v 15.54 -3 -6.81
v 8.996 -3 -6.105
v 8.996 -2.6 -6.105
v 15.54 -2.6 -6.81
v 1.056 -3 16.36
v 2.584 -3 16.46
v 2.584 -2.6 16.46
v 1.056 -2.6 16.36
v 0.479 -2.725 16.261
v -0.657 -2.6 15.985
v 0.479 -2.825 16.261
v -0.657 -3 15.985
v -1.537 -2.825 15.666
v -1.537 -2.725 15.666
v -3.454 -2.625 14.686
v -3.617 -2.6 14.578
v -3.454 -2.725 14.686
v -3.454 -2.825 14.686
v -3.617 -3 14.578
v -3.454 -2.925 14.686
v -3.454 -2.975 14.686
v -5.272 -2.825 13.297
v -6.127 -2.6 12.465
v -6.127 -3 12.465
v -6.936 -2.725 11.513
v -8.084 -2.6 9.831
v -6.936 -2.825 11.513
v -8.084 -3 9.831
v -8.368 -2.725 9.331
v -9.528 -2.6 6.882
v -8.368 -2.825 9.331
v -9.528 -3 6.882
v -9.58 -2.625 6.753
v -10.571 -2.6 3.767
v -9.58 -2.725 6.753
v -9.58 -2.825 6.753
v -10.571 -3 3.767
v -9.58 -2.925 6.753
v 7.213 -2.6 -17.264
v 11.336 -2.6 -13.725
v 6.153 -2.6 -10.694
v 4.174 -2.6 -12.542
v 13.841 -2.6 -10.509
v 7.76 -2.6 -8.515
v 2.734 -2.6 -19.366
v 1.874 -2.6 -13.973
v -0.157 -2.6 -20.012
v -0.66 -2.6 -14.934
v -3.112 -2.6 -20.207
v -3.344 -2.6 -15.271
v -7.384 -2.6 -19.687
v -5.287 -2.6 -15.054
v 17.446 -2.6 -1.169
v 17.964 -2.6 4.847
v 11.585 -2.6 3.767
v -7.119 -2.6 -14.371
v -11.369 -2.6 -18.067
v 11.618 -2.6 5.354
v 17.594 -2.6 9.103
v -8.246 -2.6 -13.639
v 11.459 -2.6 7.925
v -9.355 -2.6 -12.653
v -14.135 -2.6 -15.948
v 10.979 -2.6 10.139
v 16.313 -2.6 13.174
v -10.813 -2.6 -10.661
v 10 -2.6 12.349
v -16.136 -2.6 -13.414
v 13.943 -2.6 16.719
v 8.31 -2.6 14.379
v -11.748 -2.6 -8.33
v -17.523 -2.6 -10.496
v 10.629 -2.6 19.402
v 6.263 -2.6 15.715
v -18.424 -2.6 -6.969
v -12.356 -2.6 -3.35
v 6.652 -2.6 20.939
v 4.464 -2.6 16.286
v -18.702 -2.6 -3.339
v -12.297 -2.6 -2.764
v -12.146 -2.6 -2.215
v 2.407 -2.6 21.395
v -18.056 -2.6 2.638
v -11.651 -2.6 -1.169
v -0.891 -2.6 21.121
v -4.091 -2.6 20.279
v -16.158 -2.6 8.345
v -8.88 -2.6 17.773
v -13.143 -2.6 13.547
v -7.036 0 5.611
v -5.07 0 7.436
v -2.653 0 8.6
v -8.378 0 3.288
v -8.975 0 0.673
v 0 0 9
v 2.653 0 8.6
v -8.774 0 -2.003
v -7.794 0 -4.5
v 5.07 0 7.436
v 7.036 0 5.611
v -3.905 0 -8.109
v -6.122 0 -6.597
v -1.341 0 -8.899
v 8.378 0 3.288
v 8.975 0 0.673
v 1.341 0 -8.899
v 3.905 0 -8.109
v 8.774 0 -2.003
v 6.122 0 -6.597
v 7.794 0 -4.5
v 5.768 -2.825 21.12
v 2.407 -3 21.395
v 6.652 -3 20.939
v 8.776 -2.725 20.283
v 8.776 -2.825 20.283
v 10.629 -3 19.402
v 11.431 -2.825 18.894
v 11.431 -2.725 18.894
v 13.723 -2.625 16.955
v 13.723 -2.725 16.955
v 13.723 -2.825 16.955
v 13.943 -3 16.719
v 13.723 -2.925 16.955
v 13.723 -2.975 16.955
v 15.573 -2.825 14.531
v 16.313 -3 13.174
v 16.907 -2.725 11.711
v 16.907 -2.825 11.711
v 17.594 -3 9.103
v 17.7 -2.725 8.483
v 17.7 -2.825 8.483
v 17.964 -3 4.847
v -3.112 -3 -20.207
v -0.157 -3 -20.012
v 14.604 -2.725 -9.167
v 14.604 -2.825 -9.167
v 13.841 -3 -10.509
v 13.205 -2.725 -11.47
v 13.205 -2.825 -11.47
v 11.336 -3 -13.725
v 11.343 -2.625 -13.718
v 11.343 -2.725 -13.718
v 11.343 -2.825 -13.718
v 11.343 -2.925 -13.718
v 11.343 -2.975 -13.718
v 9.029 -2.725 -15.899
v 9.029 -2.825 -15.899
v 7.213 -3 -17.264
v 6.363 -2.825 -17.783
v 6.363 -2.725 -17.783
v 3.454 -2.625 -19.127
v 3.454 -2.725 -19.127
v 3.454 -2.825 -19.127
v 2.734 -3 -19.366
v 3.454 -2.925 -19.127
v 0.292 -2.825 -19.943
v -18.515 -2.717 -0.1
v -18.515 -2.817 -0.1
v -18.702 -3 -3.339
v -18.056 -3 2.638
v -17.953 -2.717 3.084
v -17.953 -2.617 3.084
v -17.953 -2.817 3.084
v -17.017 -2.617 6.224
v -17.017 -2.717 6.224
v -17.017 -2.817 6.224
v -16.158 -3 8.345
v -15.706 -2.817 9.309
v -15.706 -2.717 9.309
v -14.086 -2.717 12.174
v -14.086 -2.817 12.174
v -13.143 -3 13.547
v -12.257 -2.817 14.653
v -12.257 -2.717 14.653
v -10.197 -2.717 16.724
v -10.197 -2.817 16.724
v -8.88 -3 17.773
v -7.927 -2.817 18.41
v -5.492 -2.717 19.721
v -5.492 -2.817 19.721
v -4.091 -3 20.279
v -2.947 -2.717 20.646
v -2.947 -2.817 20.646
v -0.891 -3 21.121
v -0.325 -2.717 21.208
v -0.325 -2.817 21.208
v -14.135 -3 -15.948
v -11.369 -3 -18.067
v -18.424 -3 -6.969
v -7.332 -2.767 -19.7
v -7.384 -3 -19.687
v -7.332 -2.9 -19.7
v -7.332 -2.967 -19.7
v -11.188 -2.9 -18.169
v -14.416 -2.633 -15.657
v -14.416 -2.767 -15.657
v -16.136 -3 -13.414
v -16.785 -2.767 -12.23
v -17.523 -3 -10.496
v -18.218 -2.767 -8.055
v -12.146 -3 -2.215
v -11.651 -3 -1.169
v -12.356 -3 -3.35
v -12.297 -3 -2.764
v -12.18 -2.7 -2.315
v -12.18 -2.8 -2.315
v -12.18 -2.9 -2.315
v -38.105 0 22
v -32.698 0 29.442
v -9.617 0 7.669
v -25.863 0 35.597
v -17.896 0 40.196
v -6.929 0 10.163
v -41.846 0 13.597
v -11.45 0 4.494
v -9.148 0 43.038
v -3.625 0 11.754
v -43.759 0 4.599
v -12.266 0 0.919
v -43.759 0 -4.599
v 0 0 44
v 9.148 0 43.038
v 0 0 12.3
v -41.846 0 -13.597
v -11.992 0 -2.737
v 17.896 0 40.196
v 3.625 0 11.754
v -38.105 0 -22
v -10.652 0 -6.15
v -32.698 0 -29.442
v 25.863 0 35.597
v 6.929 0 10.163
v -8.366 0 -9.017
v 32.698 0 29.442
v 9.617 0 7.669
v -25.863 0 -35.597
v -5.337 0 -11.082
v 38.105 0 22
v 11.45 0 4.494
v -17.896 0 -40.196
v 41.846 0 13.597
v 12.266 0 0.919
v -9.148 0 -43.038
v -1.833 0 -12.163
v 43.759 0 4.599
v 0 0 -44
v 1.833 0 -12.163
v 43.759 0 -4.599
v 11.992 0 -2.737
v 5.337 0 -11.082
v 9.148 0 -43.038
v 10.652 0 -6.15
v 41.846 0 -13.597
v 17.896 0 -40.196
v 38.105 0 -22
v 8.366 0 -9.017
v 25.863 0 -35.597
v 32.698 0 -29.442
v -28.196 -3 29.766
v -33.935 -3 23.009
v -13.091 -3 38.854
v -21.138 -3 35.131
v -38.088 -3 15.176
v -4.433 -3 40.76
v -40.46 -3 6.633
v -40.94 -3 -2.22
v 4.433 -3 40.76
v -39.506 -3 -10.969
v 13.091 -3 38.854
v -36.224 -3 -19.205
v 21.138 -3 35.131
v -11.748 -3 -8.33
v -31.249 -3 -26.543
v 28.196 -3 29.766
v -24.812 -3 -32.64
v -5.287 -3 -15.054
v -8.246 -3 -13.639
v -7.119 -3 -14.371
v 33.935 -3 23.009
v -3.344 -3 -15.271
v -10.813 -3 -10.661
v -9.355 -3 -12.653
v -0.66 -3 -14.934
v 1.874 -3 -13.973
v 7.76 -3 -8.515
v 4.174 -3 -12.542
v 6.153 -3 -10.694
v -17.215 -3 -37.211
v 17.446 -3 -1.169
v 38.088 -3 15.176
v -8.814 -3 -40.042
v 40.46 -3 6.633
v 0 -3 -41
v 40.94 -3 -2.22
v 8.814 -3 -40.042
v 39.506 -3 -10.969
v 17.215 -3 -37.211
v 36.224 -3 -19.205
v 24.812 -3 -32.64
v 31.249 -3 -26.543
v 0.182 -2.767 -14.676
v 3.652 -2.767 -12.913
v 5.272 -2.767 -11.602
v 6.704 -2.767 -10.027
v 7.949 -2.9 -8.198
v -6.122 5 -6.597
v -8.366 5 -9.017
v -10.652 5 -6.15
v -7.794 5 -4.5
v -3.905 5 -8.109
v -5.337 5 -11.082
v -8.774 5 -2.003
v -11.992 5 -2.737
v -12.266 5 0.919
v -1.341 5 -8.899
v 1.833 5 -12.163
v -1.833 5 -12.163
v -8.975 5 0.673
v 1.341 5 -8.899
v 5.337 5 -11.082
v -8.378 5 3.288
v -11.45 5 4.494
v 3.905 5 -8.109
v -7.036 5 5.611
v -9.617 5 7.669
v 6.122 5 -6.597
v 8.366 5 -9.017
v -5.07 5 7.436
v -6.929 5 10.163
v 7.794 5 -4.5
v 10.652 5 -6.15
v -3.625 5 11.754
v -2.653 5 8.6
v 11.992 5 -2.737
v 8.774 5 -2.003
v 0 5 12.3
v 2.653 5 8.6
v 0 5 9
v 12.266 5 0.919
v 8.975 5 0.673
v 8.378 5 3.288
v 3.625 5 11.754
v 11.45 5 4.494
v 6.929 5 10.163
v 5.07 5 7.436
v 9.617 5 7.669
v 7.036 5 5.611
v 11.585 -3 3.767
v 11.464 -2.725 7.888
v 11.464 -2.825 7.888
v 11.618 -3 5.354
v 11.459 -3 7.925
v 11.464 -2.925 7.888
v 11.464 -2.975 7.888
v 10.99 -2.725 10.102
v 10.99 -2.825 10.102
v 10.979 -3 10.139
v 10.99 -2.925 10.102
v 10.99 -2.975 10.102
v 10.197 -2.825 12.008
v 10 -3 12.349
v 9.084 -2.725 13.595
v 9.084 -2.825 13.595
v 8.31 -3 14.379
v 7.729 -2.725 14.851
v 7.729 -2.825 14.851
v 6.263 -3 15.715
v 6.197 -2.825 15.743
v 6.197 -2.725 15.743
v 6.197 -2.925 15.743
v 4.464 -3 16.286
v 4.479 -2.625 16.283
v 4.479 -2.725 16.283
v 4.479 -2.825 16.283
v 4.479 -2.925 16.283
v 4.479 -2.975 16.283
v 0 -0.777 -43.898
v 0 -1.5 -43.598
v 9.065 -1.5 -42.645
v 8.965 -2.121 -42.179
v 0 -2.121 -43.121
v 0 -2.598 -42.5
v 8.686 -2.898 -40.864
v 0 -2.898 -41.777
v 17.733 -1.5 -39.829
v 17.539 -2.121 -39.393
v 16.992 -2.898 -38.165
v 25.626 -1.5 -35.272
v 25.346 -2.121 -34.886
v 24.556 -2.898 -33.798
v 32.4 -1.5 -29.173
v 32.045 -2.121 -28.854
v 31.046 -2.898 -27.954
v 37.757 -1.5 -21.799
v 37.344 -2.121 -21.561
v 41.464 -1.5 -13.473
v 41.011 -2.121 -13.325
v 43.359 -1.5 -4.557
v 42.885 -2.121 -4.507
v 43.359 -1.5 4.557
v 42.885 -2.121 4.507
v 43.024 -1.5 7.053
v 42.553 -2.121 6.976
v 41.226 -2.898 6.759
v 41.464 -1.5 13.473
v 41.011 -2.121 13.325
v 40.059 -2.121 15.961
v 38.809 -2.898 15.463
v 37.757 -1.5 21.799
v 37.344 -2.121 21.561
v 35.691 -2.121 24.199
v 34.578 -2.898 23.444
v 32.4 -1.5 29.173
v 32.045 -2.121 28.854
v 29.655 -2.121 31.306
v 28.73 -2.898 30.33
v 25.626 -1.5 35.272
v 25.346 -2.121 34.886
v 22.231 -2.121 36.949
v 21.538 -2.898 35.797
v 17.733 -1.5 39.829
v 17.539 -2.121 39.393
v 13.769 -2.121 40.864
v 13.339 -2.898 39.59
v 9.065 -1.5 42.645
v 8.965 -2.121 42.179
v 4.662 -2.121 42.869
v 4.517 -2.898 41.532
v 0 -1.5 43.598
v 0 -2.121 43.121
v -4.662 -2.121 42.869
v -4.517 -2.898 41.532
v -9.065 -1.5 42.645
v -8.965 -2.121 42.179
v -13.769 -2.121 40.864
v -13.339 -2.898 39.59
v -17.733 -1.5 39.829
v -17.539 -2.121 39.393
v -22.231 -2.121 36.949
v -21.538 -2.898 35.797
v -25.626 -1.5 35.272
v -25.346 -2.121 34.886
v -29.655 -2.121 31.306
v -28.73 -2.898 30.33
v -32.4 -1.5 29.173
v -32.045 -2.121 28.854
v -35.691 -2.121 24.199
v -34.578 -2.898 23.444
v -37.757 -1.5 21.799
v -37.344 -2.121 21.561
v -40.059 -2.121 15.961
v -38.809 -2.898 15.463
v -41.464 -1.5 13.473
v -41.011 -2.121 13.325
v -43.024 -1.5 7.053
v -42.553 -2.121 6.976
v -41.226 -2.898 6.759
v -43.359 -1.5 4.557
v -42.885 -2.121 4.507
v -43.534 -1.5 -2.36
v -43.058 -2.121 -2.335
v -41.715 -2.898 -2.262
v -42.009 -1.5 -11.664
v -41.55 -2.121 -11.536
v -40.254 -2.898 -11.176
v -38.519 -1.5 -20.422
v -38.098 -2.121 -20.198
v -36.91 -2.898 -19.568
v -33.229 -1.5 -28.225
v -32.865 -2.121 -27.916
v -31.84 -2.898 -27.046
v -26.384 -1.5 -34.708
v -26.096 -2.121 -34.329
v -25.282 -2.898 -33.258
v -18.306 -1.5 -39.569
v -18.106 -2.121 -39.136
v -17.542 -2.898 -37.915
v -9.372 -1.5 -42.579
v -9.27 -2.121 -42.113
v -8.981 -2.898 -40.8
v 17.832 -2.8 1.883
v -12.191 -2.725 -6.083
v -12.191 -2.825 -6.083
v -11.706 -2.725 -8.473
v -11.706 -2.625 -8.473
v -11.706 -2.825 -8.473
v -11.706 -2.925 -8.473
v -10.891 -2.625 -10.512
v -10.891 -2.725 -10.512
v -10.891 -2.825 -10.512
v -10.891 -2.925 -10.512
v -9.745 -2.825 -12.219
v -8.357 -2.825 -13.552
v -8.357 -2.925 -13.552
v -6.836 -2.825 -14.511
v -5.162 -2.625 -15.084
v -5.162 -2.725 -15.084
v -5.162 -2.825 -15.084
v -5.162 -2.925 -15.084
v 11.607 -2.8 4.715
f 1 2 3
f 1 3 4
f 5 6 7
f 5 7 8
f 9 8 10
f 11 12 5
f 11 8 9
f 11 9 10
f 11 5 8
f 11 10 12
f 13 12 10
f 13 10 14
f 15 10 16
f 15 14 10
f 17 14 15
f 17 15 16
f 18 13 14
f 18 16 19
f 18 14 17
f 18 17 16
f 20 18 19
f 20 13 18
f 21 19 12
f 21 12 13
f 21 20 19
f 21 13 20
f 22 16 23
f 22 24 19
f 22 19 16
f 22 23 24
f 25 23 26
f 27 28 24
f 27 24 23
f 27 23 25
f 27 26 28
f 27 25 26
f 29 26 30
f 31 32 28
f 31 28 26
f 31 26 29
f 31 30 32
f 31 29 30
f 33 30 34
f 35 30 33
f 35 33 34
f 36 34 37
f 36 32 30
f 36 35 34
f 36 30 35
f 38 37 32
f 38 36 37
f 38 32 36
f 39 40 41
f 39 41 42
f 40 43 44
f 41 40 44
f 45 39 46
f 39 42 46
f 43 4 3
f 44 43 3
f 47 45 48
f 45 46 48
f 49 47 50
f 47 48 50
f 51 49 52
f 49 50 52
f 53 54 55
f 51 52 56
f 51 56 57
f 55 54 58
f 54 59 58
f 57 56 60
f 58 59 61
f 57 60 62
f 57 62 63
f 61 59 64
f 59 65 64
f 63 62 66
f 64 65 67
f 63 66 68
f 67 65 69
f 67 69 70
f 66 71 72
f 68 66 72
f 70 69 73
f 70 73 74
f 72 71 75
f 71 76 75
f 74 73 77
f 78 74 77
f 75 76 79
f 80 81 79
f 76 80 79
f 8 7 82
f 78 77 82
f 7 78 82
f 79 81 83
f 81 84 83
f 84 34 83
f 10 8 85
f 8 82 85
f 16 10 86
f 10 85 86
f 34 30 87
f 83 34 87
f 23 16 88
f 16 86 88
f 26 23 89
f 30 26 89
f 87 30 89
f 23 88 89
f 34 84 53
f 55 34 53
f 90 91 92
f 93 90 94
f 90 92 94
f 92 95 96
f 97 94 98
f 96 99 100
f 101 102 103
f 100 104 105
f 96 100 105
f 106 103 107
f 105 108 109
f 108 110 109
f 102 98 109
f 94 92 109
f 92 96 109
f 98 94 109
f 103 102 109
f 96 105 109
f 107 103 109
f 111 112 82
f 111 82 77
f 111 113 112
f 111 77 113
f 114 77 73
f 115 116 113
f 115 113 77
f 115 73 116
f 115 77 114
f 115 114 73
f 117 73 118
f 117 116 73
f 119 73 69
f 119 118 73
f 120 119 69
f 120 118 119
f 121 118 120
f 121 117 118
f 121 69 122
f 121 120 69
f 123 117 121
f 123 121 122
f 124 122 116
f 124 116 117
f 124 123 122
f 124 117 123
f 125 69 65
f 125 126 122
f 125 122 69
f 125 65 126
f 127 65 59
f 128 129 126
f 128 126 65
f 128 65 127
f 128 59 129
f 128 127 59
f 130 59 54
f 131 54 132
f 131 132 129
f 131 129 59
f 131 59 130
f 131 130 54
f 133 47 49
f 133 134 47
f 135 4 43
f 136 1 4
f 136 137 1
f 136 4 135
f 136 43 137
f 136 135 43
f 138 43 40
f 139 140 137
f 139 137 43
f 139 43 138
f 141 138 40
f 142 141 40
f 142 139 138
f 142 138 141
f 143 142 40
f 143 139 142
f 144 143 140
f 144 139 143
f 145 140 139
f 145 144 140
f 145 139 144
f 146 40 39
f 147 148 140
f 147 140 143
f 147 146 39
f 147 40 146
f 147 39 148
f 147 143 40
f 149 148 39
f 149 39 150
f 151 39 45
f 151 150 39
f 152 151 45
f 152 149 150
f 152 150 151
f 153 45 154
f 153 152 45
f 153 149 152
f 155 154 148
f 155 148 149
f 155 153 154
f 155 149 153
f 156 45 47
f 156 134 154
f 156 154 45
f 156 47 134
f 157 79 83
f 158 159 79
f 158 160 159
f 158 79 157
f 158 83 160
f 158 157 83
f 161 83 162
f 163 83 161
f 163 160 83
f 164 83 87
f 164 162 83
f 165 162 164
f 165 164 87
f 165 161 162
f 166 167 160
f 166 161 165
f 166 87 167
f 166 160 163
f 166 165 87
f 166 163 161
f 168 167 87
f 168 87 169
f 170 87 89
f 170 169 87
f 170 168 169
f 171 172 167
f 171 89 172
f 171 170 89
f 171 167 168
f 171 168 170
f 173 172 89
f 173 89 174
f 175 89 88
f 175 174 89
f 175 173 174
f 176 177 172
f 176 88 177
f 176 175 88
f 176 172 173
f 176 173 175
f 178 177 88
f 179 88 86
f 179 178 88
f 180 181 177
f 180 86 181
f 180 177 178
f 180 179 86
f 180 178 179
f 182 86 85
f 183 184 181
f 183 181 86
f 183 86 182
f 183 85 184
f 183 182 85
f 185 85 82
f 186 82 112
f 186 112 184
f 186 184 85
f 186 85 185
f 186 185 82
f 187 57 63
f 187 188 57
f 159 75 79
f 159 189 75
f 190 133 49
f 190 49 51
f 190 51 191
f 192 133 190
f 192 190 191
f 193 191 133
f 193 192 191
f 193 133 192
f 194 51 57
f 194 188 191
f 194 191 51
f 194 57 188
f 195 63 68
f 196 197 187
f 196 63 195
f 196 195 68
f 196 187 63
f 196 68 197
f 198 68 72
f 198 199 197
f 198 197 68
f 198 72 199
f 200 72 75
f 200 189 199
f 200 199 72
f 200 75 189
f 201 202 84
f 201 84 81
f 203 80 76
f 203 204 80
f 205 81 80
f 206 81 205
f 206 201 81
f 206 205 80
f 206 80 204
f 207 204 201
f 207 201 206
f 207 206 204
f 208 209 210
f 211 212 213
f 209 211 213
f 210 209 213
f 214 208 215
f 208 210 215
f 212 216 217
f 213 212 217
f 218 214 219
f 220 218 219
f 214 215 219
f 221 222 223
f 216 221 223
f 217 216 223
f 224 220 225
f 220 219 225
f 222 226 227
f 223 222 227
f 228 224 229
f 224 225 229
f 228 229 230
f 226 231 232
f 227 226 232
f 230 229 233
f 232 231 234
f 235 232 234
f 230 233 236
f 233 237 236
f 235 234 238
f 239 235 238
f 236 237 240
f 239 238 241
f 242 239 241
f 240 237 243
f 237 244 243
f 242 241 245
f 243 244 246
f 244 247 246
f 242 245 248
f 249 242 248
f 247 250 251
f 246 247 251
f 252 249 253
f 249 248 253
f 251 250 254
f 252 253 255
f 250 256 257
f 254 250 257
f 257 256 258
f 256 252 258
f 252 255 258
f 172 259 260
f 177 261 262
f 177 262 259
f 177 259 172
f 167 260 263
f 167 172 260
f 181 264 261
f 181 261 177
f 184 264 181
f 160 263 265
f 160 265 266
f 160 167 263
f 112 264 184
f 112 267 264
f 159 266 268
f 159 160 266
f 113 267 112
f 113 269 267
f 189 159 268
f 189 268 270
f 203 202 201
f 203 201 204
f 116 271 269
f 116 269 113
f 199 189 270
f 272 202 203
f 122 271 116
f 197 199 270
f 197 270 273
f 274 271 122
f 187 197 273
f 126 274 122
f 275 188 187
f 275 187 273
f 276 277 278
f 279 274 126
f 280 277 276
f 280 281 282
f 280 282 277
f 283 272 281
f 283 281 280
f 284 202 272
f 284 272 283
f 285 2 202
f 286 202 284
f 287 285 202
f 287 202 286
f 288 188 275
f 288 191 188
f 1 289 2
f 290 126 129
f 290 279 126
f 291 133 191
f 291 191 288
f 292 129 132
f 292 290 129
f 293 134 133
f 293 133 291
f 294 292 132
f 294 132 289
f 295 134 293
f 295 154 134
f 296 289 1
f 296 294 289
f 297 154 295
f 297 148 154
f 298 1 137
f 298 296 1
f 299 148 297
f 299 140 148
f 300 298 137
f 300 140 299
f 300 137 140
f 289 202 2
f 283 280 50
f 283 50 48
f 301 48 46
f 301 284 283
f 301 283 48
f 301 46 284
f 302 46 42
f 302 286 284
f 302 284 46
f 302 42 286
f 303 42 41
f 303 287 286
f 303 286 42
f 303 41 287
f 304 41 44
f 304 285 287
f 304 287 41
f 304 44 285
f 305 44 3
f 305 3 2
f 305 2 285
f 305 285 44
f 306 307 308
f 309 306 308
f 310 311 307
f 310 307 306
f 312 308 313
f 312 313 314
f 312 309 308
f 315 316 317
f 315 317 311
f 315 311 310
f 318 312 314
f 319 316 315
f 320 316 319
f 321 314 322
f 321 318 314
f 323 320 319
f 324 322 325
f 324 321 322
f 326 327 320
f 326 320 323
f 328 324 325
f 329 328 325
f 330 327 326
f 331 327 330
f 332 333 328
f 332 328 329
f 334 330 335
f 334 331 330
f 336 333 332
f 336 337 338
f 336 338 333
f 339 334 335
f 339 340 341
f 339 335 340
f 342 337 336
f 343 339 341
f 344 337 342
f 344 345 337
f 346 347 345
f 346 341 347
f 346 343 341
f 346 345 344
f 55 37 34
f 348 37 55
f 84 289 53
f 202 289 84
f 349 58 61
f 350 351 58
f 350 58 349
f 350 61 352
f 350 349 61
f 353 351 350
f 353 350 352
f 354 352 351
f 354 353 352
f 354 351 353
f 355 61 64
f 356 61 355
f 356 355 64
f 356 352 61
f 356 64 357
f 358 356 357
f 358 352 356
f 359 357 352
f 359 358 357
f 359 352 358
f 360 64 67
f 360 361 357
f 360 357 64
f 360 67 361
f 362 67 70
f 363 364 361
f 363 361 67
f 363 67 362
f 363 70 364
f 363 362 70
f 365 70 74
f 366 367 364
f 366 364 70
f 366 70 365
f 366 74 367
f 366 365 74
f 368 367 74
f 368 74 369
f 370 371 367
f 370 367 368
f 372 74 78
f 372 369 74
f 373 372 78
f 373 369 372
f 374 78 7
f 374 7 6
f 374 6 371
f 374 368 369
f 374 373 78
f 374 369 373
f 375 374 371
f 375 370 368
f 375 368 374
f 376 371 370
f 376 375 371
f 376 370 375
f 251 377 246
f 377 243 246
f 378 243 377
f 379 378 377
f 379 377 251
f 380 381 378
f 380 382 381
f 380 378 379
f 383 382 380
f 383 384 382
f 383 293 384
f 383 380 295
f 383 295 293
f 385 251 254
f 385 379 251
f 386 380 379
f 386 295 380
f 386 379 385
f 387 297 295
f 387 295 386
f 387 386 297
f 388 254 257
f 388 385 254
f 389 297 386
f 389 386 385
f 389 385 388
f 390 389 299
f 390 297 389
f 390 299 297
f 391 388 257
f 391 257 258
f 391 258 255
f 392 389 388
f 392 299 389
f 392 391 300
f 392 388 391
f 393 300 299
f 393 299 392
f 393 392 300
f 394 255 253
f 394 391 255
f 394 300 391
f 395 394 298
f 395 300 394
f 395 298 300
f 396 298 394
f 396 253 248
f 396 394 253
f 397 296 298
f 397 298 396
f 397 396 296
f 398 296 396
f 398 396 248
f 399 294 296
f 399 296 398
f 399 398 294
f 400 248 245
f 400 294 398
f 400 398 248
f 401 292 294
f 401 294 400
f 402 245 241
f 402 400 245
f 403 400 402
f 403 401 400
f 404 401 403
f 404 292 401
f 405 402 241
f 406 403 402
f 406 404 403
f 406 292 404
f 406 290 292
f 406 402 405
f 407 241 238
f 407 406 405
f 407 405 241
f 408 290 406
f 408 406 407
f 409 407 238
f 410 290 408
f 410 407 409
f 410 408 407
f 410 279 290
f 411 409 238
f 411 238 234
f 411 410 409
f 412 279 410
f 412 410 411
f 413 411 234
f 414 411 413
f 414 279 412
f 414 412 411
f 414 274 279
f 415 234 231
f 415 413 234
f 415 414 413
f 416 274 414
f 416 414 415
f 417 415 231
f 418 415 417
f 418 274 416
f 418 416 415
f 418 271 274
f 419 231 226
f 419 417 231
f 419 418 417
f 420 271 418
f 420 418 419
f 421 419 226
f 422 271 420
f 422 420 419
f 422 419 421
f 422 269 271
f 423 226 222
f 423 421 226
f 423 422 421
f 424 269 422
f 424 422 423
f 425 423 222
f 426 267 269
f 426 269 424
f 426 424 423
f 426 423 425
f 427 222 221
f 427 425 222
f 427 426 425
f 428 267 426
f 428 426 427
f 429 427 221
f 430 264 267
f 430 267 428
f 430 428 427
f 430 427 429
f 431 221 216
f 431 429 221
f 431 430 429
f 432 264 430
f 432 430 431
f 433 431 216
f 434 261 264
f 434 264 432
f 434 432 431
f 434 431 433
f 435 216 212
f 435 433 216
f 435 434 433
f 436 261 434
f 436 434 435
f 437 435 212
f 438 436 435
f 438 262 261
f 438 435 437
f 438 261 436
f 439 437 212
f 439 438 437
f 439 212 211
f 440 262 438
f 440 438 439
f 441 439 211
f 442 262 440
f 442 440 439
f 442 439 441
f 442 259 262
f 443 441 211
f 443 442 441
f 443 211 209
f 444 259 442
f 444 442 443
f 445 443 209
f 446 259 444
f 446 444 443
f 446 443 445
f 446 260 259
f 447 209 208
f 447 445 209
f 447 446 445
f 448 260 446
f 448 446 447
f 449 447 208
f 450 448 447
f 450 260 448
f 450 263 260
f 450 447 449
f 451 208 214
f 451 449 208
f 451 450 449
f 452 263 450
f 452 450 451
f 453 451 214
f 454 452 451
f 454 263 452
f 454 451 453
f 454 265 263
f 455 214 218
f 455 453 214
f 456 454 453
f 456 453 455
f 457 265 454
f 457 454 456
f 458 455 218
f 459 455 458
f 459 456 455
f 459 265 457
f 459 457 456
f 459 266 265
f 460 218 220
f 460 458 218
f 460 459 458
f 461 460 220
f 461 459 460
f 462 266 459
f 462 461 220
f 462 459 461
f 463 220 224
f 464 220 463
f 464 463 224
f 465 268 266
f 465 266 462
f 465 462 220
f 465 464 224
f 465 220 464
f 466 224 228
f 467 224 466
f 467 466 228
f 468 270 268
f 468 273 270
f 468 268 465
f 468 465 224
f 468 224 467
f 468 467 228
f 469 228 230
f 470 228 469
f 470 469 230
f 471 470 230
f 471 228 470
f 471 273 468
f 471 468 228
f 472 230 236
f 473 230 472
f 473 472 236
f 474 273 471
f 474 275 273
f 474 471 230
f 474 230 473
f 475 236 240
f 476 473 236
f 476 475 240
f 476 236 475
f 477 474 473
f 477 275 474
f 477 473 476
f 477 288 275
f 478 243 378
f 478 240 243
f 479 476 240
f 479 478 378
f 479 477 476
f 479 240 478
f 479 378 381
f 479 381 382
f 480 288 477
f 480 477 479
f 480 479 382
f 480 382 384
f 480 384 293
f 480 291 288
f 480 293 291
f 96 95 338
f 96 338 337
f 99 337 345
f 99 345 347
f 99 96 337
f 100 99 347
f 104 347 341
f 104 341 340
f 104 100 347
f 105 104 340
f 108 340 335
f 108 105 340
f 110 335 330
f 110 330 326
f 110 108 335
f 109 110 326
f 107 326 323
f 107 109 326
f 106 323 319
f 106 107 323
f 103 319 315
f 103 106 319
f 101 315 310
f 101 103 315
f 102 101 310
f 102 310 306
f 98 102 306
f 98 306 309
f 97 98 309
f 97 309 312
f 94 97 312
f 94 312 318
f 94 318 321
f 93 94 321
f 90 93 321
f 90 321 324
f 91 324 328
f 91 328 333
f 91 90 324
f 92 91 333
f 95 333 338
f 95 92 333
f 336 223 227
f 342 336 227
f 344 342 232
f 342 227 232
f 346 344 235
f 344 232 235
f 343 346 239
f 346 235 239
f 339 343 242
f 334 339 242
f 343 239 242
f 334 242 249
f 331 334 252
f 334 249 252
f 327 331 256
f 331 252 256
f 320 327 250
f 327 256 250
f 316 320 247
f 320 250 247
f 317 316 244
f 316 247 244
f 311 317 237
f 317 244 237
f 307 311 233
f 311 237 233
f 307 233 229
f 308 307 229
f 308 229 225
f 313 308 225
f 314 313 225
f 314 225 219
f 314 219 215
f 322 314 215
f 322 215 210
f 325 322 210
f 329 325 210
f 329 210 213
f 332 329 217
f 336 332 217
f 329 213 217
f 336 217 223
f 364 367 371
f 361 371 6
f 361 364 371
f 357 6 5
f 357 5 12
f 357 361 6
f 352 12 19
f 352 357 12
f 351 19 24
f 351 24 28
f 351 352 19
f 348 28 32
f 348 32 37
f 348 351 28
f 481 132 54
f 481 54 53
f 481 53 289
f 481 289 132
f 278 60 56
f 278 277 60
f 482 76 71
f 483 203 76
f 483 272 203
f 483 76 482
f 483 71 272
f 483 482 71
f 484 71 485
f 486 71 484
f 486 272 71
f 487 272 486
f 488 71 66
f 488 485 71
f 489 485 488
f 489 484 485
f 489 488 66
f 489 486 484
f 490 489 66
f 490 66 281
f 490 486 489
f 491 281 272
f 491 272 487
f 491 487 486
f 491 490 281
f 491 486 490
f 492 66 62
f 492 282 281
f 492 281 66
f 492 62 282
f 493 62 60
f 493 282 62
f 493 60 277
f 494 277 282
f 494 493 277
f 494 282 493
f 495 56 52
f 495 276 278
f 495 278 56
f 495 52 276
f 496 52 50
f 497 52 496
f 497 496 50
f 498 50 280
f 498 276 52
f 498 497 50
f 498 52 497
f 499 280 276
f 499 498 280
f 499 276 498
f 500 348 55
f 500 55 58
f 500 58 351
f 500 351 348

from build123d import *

# Parameters (mm, degrees)
SKETCH_1_R          = 12.3
SKETCH_1_R_2        = 9
EXTRUDE_1_DEPTH     = 5
SKETCH_2_R          = 44
EXTRUDE_2_DEPTH     = 3
FILLET_1_R          = 3
CUT_EXTRUDE_1_DEPTH = 0.4


with BuildPart() as part:
    # Эскиз1 → Бобышка-Вытянуть1 (new body)
    with BuildSketch(Plane(origin=(0, 0, 0), x_dir=(1, 0, 0), z_dir=(0, 1, 0))):
        with Locations(Location((0, 0, 0), (0, 0, 270))):
            Circle(SKETCH_1_R)
        with Locations(Location((0, 0, 0), (0, 0, 270))):
            Circle(SKETCH_1_R_2, mode=Mode.SUBTRACT)
    extrude(amount=EXTRUDE_1_DEPTH)

    # Эскиз2 → Бобышка-Вытянуть2 (add)
    with BuildSketch(Plane.XZ):
        with Locations(Location((0, 0, 0), (0, 0, 270))):
            Circle(SKETCH_2_R)
    extrude(amount=EXTRUDE_2_DEPTH)

    # Скругление1
    fillet_1_edges = [part.edges().sort_by_distance(p)[0] for p in [
        (0, -3, 44),
    ]]
    fillet(fillet_1_edges, radius=FILLET_1_R - 0.0001)  # a hair under: the kernel refuses the full size

    # Эскиз3 → Вырез-Вытянуть1 (cut)
    with BuildSketch(Plane.XZ.offset(3)):
        with BuildLine():
            Line((8.995970712, -6.104573863), (15.540441866, -6.809702068))
            add(Edge.make_bspline(
                [(15.540441866, -6.809702068), (15.412468117, -7.209291312), (15.154055197, -8.016167909), (14.613314091, -9.189585554), (13.958158021, -10.343258865), (13.207970677, -11.497332402), (12.335909119, -12.632612277), (11.33678469, -13.743257832), (10.235946519, -14.845807978), (9.032648574, -15.91638665), (7.753536664, -16.930703687), (6.377129387, -17.80304501), (4.944504921, -18.539269968), (3.454192561, -19.15568009), (1.899553784, -19.624607238), (0.282665391, -19.970371161), (-1.395976393, -20.169412876), (-2.535298753, -20.19445388), (-3.112402685, -20.207137965)],
                knots=[0, 0, 0, 0, 0.821440156, 1.658705401, 2.525323128, 3.419405186, 4.353419828, 5.32681938, 6.344399772, 7.404443113, 8.481060479, 9.538977106, 10.591299887, 11.633537695, 12.694215778, 13.768160887, 14.869500701, 16, 16, 16, 16], degree=3))
            add(Edge.make_bspline(
                [(-3.112402685, -20.207137965), (-3.830059973, -20.180219947), (-5.24950882, -20.126979006), (-7.333765847, -19.748485297), (-9.324321869, -19.100876457), (-11.205038798, -18.21140963), (-12.947033456, -17.089230598), (-14.454993346, -15.681556769), (-15.775431133, -14.076428854), (-16.836564852, -12.230966933), (-17.674056128, -10.211434225), (-18.260978719, -8.036915844), (-18.637890858, -5.732029495), (-18.680542171, -4.148625261), (-18.702346595, -3.339149183)],
                knots=[0, 0, 0, 0, 0.998551589, 1.975027533, 2.936744805, 3.903838964, 4.863557655, 5.807675034, 6.763178998, 7.745855275, 8.758641806, 9.797744155, 10.874151411, 12, 12, 12, 12], degree=3))
            add(Edge.make_bspline(
                [(-18.702346595, -3.339149183), (-18.694827115, -2.798940969), (-18.679761602, -1.716616884), (-18.527910505, -0.102284621), (-18.301586091, 1.502865479), (-17.965102533, 3.090290283), (-17.549772791, 4.670349499), (-17.029049457, 6.231978524), (-16.419967141, 7.784615504), (-15.720819637, 9.310739002), (-14.951153945, 10.78597136), (-14.104651779, 12.165779349), (-13.228965259, 13.463701063), (-12.281997416, 14.653281312), (-11.271614555, 15.73843901), (-10.215647458, 16.72916995), (-9.109657465, 17.6327847), (-7.937840655, 18.421008283), (-6.733157575, 19.121726424), (-5.503022782, 19.73623986), (-4.241088179, 20.242359886), (-2.95541361, 20.657688994), (-1.650714865, 20.995350946), (-0.320069938, 21.221805432), (1.034040545, 21.37348169), (1.947944187, 21.388084339), (2.407429046, 21.395426137)],
                knots=[0, 0, 0, 0, 1.075906032, 2.155611451, 3.227554832, 4.30373447, 5.38628686, 6.480642286, 7.581143633, 8.707391042, 9.82337293, 10.893692135, 11.930684225, 12.940768785, 13.919223559, 14.881988069, 15.823529777, 16.761054785, 17.692163021, 18.598508727, 19.497917784, 20.397951545, 21.288749041, 22.180057169, 23.084984307, 24, 24, 24, 24], degree=3))
            add(Edge.make_bspline(
                [(2.407429046, 21.395426137), (2.984709253, 21.38436262), (4.110243009, 21.362791879), (5.755422445, 21.146858145), (7.309280074, 20.798674498), (8.776183147, 20.306894686), (10.163630571, 19.698295383), (11.445405048, 18.914546867), (12.642602428, 18.007561118), (13.744215102, 16.970925789), (14.740391422, 15.815186826), (15.5940589, 14.539264454), (16.346732625, 13.178856469), (16.935563309, 11.70304546), (17.399883233, 10.131680694), (17.72749797, 8.457159294), (17.928240109, 6.684462125), (17.952122631, 5.468151048), (17.964320071, 4.846948573)],
                knots=[0, 0, 0, 0, 1.079196217, 2.10412856, 3.097265039, 4.052997914, 4.993829394, 5.924450447, 6.855882321, 7.798592485, 8.748507102, 9.702980304, 10.665060364, 11.651045023, 12.668191174, 13.725659051, 14.838433479, 16, 16, 16, 16], degree=3))
            add(Edge.make_bspline(
                [(17.964320071, 4.846948573), (17.939861422, 3.857360897), (17.890041697, 1.84167366), (17.596116304, -0.153181552), (17.446491546, -1.168676427)],
                knots=[0, 0, 0, 0, 0.981886135, 2, 2, 2, 2], degree=3))
            Line((17.446491546, -1.168676427), (-11.651064544, -1.168676427))
            add(Edge.make_bspline(
                [(-11.651064544, -1.168676427), (-11.757884651, -1.36504795), (-11.95927427, -1.735270255), (-12.188010225, -2.298230913), (-12.326177646, -2.83296849), (-12.346562226, -3.184220667), (-12.356192749, -3.350166811)],
                knots=[0, 0, 0, 0, 1.156942796, 2.181202349, 3.140724307, 4, 4, 4, 4], degree=3))
            add(Edge.make_bspline(
                [(-12.356192749, -3.350166811), (-12.34747649, -3.820530136), (-12.330558483, -4.733491811), (-12.207588937, -6.058525833), (-12.012779093, -7.30055293), (-11.73295496, -8.457242596), (-11.349108398, -9.521277255), (-10.912446511, -10.511594722), (-10.387891199, -11.419433456), (-9.762517234, -12.22046917), (-9.095103061, -12.940939566), (-8.37345163, -13.553599554), (-7.633662355, -14.094798444), (-6.845003469, -14.527977227), (-6.01676525, -14.853496387), (-5.158998119, -15.10327405), (-4.2632374, -15.248645974), (-3.652782517, -15.263647049), (-3.343772877, -15.271240529)],
                knots=[0, 0, 0, 0, 1.346284225, 2.613098929, 3.805631801, 4.942804233, 6.013450698, 7.039235158, 8.038108926, 9.00533571, 9.942442562, 10.84439418, 11.710848438, 12.56244313, 13.41163356, 14.253504373, 15.115931414, 16, 16, 16, 16], degree=3))
            add(Edge.make_bspline(
                [(-3.343772877, -15.271240529), (-2.749342022, -15.245702869), (-1.550628193, -15.194204288), (0.219580647, -14.702324431), (1.984521743, -13.976401138), (3.39348022, -13.111143469), (4.503332391, -12.310342129), (5.279497704, -11.607205665), (6.028705195, -10.857717747), (6.714675872, -10.028152313), (7.372080008, -9.148002655), (7.963425509, -8.192752467), (8.520742644, -7.181562683), (8.836014409, -6.467075917), (8.995970712, -6.104573863)],
                knots=[0, 0, 0, 0, 1.313044299, 2.647851039, 4.03980324, 5.527339259, 6.29475363, 7.066375866, 7.842396062, 8.63863277, 9.446691243, 10.272184996, 11.123375662, 12, 12, 12, 12], degree=3))
        make_face()
        with BuildLine():
            Line((-10.57133698, 3.767221009), (11.585113341, 3.767221009))
            add(Edge.make_bspline(
                [(11.585113341, 3.767221009), (11.593025495, 4.083048202), (11.606273104, 4.611849202), (11.614751545, 5.140746771), (11.618166225, 5.353759471)],
                knots=[0, 0, 0, 0, 1.194503009, 2, 2, 2, 2], degree=3))
            add(Edge.make_bspline(
                [(11.618166225, 5.353759471), (11.607865414, 5.787266581), (11.587754302, 6.633637755), (11.485258286, 7.865088987), (11.282712763, 9.016930024), (11.014497534, 10.093427235), (10.643340787, 11.084224083), (10.22296171, 12.00905194), (9.693440715, 12.841121184), (9.10342503, 13.5981791), (8.450495006, 14.275095215), (7.747736216, 14.858424007), (6.995642953, 15.349517378), (6.205542288, 15.762387273), (5.357586525, 16.065155124), (4.475125766, 16.303564325), (3.542488324, 16.434420376), (2.907267946, 16.451055439), (2.583711097, 16.459528702)],
                knots=[0, 0, 0, 0, 1.288915635, 2.516454775, 3.668675548, 4.762204166, 5.808675246, 6.809806692, 7.776046417, 8.732555008, 9.659000055, 10.566141369, 11.441184925, 12.324901883, 13.209090714, 14.112018255, 15.038334656, 16, 16, 16, 16], degree=3))
            add(Edge.make_bspline(
                [(2.583711097, 16.459528702), (2.226745831, 16.453545839), (1.52033684, 16.441706179), (0.475354062, 16.270793025), (-0.551481717, 16.041052654), (-1.545895478, 15.676402937), (-2.521085999, 15.236321875), (-3.474458828, 14.69783397), (-4.385955956, 14.033830496), (-5.29217066, 13.304160782), (-6.156416477, 12.463653114), (-6.953362323, 11.511724736), (-7.714463763, 10.47410691), (-8.384666445, 9.319187587), (-9.037211223, 8.085112247), (-9.596912384, 6.732446378), (-10.136432386, 5.293123636), (-10.424137331, 4.283684469), (-10.57133698, 3.767221009)],
                knots=[0, 0, 0, 0, 0.867869597, 1.717452491, 2.571772394, 3.425671253, 4.289803496, 5.174634535, 6.084973587, 7.031591473, 8.005136717, 9.013559597, 10.050697067, 11.133079613, 12.260592687, 13.446148552, 14.693362615, 16, 16, 16, 16], degree=3))
        make_face(mode=Mode.SUBTRACT)
    extrude(amount=-CUT_EXTRUDE_1_DEPTH, mode=Mode.SUBTRACT)


solid = part.part
